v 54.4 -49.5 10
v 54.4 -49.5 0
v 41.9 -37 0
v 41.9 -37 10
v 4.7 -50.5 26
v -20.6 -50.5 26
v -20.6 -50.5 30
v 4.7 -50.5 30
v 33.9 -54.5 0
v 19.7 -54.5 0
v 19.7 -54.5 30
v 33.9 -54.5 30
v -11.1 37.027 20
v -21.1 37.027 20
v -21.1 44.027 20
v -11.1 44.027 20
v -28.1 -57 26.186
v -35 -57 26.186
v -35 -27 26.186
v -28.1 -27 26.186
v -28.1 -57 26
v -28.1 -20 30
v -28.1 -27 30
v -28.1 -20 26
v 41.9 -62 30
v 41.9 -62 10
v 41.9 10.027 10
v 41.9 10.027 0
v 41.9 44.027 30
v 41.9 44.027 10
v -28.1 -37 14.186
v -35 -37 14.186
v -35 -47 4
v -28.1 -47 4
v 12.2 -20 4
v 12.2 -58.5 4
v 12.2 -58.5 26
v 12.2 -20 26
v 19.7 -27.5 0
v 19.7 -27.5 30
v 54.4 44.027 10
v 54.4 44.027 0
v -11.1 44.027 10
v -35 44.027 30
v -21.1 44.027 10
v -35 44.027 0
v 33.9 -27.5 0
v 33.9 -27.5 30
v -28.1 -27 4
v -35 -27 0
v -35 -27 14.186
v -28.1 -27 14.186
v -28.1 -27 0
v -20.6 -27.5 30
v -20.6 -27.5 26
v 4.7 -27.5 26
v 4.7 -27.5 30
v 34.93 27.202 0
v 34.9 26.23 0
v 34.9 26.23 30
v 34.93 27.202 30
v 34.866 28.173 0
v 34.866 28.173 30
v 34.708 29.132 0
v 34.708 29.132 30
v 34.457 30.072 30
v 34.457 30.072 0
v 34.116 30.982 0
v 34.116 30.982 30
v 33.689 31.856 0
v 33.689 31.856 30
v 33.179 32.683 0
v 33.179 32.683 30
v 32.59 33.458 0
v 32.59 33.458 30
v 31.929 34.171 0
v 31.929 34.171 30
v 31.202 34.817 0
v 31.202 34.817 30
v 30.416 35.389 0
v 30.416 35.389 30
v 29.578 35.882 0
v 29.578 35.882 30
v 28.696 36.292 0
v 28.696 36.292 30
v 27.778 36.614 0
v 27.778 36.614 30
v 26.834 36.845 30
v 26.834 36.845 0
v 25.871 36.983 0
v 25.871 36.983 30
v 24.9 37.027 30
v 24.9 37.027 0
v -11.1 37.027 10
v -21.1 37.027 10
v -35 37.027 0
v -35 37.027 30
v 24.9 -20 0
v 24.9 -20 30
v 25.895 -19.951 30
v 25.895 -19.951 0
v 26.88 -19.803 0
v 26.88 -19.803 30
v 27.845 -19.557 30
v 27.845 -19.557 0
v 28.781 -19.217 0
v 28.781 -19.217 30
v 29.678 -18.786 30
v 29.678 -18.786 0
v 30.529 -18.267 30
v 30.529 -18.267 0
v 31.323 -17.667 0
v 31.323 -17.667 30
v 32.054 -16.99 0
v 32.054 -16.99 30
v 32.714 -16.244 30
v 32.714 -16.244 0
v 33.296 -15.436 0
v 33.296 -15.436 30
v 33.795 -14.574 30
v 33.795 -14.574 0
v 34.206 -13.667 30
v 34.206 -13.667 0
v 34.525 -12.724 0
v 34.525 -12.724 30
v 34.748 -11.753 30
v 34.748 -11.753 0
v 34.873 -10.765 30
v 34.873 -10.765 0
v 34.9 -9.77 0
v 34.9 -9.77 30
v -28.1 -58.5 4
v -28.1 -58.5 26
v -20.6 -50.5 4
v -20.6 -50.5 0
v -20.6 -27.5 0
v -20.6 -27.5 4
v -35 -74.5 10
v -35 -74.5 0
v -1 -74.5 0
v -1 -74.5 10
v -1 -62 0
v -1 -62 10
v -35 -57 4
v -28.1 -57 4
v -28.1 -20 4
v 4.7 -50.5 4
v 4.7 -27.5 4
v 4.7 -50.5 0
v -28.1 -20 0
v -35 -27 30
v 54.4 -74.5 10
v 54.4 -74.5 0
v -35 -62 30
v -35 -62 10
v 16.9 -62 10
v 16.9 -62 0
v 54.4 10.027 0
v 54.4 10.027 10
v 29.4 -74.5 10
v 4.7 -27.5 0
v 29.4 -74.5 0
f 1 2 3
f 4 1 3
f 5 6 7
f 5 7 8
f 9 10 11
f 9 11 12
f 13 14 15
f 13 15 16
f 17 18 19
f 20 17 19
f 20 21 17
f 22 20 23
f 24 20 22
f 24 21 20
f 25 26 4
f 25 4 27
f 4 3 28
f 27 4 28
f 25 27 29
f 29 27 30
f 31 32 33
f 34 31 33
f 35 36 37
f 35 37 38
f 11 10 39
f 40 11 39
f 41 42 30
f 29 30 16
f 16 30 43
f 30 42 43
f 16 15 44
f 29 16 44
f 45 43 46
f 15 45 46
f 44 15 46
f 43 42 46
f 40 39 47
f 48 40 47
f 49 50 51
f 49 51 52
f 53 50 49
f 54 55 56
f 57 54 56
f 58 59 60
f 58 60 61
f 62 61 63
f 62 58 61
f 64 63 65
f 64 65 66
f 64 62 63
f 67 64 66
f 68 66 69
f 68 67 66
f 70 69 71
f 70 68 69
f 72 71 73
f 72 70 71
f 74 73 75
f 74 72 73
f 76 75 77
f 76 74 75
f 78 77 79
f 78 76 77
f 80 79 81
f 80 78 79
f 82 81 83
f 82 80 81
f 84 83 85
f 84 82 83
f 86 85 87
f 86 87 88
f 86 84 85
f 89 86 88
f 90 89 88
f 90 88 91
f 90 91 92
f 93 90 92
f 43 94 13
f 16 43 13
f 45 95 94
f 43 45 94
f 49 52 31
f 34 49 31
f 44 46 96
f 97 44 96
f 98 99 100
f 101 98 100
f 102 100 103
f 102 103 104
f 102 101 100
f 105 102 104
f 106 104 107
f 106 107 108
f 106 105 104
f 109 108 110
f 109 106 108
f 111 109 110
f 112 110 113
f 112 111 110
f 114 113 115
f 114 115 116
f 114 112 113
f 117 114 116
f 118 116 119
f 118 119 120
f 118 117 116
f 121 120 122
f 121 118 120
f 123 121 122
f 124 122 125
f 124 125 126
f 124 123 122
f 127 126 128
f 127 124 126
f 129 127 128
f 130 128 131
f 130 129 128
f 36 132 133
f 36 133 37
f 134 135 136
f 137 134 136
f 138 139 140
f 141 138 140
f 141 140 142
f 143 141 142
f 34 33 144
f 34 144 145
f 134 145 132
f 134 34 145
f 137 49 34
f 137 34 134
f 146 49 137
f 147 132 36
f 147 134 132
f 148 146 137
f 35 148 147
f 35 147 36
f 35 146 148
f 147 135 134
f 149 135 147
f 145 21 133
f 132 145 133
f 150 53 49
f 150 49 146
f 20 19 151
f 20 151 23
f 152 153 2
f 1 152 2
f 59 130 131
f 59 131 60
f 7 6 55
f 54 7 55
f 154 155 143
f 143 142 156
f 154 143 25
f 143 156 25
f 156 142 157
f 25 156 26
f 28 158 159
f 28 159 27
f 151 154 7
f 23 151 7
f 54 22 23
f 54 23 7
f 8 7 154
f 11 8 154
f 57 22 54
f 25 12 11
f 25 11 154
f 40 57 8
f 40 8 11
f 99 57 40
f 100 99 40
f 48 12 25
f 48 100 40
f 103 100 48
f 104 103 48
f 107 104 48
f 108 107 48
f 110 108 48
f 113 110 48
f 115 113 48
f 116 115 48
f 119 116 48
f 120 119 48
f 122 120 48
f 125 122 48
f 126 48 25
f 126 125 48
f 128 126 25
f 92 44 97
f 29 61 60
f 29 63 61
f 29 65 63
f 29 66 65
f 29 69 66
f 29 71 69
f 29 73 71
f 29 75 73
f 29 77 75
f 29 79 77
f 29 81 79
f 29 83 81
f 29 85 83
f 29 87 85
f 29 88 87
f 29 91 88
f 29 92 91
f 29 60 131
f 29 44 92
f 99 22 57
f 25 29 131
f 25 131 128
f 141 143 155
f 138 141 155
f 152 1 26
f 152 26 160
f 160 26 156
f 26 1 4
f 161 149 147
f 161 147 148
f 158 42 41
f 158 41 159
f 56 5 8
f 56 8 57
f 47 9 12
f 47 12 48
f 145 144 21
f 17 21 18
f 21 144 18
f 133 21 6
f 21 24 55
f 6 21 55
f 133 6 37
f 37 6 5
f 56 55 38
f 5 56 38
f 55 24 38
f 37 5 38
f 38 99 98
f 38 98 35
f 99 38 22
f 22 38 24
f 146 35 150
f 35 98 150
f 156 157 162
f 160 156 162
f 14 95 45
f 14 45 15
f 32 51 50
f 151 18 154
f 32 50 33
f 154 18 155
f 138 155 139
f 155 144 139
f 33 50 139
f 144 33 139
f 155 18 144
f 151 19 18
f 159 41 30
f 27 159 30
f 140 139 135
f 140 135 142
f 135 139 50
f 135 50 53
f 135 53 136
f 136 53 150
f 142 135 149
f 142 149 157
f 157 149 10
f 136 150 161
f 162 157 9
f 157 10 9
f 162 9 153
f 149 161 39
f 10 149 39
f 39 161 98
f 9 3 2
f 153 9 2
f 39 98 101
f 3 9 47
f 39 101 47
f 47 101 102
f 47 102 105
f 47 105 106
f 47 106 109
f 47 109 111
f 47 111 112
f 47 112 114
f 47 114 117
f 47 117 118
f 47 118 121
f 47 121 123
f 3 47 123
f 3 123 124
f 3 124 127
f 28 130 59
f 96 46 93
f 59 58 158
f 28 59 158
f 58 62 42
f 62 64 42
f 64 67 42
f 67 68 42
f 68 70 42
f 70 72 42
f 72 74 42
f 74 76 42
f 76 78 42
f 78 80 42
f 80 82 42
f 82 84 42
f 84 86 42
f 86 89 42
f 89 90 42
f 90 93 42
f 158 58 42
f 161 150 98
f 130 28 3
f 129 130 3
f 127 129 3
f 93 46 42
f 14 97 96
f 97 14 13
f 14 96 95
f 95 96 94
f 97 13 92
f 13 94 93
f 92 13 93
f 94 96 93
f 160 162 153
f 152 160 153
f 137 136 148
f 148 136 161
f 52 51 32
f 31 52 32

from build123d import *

# Parameters (mm, degrees)
PAD_DEPTH       = 30
POCKET_DEPTH    = 22
POCKET001_DEPTH = 6.9
SKETCH003_W     = 25.3
SKETCH003_H     = 23
SKETCH003_W_2   = 14.2
SKETCH003_H_2   = 27
POCKET002_DEPTH = 30
SKETCH004_W     = 10
SKETCH004_H     = 10
POCKET003_DEPTH = 50
POCKET004_DEPTH = 20


with BuildPart() as part:
    # Sketch → Pad (new body)
    with BuildSketch(Plane.XY):
        with BuildLine():
            Line((-35, 44.027333), (-35, 37.027333))
            Line((-35, 37.027333), (24.9, 37.027333))
            ThreePointArc((34.9, 26.230332), (32.268481, 33.822479), (24.9, 37.027333))
            Line((34.9, -9.769668), (34.9, 26.230332))
            ThreePointArc((24.9, -20), (32.053765, -16.990108), (34.9, -9.769668))
            Line((24.9, -20), (-28.1, -20))
            Line((-28.1, -27), (-28.1, -20))
            Line((-35, -27), (-28.1, -27))
            Line((-35, -27), (-35, -62))
            Line((-35, -62), (-35, -74.5))
            Line((-35, -74.5), (-1, -74.5))
            Line((-1, -74.5), (-1, -62))
            Line((-1, -62), (16.9, -62))
            Line((16.9, -62), (29.4, -74.5))
            Line((29.4, -74.5), (54.4, -74.5))
            Line((54.4, -74.5), (54.4, -49.5))
            Line((54.4, -49.5), (41.9, -37))
            Line((41.9, 10.027333), (41.9, -37))
            Line((54.4, 10.027333), (41.9, 10.027333))
            Line((54.4, 44.027333), (54.4, 10.027333))
            Line((41.9, 44.027333), (54.4, 44.027333))
            Line((41.9, 44.027333), (-35, 44.027333))
        make_face()
    extrude(amount=PAD_DEPTH)

    # Sketch001 → Pocket (cut)
    with BuildSketch(Plane.XY.offset(4)):
        Polygon((-28.1, -20), (-28.1, -58.5), (12.2, -58.5), (12.2, -20), (-18.1, -20), (-18.1, -13.5), (-24.1, -13.5), (-24.1, -20), align=None)
    extrude(amount=POCKET_DEPTH, mode=Mode.SUBTRACT)

    # Sketch002 → Pocket001 (cut)
    with BuildSketch(Plane.YZ.offset(-35)):
        Polygon((-27, 26.185834), (-27, 14.185834), (-37, 14.185834), (-47, 4), (-57, 4), (-57, 26.185834), align=None)
    extrude(amount=POCKET001_DEPTH, mode=Mode.SUBTRACT)

    # Sketch003 → Pocket002 (cut)
    with BuildSketch(Plane.XY):
        with Locations((-7.95, -39)):
            Rectangle(SKETCH003_W, SKETCH003_H)
        with Locations((26.8, -41)):
            Rectangle(SKETCH003_W_2, SKETCH003_H_2)
    extrude(amount=POCKET002_DEPTH, mode=Mode.SUBTRACT)

    # Sketch004 → Pocket003 (cut)
    with BuildSketch(Plane.XZ):
        with Locations((-16.1, 15)):
            Rectangle(SKETCH004_W, SKETCH004_H)
    extrude(amount=-POCKET003_DEPTH, mode=Mode.SUBTRACT)

    # Sketch005 → Pocket004 (cut)
    with BuildSketch(Plane.XY.offset(10)):
        Polygon((54.4, -61.416298), (54.4, -74.5), (-35, -74.5), (-35, -62), (41.9, -62), (41.9, 44.9), (54.4, 44.9), align=None)
    extrude(amount=POCKET004_DEPTH, mode=Mode.SUBTRACT)


solid = part.part
